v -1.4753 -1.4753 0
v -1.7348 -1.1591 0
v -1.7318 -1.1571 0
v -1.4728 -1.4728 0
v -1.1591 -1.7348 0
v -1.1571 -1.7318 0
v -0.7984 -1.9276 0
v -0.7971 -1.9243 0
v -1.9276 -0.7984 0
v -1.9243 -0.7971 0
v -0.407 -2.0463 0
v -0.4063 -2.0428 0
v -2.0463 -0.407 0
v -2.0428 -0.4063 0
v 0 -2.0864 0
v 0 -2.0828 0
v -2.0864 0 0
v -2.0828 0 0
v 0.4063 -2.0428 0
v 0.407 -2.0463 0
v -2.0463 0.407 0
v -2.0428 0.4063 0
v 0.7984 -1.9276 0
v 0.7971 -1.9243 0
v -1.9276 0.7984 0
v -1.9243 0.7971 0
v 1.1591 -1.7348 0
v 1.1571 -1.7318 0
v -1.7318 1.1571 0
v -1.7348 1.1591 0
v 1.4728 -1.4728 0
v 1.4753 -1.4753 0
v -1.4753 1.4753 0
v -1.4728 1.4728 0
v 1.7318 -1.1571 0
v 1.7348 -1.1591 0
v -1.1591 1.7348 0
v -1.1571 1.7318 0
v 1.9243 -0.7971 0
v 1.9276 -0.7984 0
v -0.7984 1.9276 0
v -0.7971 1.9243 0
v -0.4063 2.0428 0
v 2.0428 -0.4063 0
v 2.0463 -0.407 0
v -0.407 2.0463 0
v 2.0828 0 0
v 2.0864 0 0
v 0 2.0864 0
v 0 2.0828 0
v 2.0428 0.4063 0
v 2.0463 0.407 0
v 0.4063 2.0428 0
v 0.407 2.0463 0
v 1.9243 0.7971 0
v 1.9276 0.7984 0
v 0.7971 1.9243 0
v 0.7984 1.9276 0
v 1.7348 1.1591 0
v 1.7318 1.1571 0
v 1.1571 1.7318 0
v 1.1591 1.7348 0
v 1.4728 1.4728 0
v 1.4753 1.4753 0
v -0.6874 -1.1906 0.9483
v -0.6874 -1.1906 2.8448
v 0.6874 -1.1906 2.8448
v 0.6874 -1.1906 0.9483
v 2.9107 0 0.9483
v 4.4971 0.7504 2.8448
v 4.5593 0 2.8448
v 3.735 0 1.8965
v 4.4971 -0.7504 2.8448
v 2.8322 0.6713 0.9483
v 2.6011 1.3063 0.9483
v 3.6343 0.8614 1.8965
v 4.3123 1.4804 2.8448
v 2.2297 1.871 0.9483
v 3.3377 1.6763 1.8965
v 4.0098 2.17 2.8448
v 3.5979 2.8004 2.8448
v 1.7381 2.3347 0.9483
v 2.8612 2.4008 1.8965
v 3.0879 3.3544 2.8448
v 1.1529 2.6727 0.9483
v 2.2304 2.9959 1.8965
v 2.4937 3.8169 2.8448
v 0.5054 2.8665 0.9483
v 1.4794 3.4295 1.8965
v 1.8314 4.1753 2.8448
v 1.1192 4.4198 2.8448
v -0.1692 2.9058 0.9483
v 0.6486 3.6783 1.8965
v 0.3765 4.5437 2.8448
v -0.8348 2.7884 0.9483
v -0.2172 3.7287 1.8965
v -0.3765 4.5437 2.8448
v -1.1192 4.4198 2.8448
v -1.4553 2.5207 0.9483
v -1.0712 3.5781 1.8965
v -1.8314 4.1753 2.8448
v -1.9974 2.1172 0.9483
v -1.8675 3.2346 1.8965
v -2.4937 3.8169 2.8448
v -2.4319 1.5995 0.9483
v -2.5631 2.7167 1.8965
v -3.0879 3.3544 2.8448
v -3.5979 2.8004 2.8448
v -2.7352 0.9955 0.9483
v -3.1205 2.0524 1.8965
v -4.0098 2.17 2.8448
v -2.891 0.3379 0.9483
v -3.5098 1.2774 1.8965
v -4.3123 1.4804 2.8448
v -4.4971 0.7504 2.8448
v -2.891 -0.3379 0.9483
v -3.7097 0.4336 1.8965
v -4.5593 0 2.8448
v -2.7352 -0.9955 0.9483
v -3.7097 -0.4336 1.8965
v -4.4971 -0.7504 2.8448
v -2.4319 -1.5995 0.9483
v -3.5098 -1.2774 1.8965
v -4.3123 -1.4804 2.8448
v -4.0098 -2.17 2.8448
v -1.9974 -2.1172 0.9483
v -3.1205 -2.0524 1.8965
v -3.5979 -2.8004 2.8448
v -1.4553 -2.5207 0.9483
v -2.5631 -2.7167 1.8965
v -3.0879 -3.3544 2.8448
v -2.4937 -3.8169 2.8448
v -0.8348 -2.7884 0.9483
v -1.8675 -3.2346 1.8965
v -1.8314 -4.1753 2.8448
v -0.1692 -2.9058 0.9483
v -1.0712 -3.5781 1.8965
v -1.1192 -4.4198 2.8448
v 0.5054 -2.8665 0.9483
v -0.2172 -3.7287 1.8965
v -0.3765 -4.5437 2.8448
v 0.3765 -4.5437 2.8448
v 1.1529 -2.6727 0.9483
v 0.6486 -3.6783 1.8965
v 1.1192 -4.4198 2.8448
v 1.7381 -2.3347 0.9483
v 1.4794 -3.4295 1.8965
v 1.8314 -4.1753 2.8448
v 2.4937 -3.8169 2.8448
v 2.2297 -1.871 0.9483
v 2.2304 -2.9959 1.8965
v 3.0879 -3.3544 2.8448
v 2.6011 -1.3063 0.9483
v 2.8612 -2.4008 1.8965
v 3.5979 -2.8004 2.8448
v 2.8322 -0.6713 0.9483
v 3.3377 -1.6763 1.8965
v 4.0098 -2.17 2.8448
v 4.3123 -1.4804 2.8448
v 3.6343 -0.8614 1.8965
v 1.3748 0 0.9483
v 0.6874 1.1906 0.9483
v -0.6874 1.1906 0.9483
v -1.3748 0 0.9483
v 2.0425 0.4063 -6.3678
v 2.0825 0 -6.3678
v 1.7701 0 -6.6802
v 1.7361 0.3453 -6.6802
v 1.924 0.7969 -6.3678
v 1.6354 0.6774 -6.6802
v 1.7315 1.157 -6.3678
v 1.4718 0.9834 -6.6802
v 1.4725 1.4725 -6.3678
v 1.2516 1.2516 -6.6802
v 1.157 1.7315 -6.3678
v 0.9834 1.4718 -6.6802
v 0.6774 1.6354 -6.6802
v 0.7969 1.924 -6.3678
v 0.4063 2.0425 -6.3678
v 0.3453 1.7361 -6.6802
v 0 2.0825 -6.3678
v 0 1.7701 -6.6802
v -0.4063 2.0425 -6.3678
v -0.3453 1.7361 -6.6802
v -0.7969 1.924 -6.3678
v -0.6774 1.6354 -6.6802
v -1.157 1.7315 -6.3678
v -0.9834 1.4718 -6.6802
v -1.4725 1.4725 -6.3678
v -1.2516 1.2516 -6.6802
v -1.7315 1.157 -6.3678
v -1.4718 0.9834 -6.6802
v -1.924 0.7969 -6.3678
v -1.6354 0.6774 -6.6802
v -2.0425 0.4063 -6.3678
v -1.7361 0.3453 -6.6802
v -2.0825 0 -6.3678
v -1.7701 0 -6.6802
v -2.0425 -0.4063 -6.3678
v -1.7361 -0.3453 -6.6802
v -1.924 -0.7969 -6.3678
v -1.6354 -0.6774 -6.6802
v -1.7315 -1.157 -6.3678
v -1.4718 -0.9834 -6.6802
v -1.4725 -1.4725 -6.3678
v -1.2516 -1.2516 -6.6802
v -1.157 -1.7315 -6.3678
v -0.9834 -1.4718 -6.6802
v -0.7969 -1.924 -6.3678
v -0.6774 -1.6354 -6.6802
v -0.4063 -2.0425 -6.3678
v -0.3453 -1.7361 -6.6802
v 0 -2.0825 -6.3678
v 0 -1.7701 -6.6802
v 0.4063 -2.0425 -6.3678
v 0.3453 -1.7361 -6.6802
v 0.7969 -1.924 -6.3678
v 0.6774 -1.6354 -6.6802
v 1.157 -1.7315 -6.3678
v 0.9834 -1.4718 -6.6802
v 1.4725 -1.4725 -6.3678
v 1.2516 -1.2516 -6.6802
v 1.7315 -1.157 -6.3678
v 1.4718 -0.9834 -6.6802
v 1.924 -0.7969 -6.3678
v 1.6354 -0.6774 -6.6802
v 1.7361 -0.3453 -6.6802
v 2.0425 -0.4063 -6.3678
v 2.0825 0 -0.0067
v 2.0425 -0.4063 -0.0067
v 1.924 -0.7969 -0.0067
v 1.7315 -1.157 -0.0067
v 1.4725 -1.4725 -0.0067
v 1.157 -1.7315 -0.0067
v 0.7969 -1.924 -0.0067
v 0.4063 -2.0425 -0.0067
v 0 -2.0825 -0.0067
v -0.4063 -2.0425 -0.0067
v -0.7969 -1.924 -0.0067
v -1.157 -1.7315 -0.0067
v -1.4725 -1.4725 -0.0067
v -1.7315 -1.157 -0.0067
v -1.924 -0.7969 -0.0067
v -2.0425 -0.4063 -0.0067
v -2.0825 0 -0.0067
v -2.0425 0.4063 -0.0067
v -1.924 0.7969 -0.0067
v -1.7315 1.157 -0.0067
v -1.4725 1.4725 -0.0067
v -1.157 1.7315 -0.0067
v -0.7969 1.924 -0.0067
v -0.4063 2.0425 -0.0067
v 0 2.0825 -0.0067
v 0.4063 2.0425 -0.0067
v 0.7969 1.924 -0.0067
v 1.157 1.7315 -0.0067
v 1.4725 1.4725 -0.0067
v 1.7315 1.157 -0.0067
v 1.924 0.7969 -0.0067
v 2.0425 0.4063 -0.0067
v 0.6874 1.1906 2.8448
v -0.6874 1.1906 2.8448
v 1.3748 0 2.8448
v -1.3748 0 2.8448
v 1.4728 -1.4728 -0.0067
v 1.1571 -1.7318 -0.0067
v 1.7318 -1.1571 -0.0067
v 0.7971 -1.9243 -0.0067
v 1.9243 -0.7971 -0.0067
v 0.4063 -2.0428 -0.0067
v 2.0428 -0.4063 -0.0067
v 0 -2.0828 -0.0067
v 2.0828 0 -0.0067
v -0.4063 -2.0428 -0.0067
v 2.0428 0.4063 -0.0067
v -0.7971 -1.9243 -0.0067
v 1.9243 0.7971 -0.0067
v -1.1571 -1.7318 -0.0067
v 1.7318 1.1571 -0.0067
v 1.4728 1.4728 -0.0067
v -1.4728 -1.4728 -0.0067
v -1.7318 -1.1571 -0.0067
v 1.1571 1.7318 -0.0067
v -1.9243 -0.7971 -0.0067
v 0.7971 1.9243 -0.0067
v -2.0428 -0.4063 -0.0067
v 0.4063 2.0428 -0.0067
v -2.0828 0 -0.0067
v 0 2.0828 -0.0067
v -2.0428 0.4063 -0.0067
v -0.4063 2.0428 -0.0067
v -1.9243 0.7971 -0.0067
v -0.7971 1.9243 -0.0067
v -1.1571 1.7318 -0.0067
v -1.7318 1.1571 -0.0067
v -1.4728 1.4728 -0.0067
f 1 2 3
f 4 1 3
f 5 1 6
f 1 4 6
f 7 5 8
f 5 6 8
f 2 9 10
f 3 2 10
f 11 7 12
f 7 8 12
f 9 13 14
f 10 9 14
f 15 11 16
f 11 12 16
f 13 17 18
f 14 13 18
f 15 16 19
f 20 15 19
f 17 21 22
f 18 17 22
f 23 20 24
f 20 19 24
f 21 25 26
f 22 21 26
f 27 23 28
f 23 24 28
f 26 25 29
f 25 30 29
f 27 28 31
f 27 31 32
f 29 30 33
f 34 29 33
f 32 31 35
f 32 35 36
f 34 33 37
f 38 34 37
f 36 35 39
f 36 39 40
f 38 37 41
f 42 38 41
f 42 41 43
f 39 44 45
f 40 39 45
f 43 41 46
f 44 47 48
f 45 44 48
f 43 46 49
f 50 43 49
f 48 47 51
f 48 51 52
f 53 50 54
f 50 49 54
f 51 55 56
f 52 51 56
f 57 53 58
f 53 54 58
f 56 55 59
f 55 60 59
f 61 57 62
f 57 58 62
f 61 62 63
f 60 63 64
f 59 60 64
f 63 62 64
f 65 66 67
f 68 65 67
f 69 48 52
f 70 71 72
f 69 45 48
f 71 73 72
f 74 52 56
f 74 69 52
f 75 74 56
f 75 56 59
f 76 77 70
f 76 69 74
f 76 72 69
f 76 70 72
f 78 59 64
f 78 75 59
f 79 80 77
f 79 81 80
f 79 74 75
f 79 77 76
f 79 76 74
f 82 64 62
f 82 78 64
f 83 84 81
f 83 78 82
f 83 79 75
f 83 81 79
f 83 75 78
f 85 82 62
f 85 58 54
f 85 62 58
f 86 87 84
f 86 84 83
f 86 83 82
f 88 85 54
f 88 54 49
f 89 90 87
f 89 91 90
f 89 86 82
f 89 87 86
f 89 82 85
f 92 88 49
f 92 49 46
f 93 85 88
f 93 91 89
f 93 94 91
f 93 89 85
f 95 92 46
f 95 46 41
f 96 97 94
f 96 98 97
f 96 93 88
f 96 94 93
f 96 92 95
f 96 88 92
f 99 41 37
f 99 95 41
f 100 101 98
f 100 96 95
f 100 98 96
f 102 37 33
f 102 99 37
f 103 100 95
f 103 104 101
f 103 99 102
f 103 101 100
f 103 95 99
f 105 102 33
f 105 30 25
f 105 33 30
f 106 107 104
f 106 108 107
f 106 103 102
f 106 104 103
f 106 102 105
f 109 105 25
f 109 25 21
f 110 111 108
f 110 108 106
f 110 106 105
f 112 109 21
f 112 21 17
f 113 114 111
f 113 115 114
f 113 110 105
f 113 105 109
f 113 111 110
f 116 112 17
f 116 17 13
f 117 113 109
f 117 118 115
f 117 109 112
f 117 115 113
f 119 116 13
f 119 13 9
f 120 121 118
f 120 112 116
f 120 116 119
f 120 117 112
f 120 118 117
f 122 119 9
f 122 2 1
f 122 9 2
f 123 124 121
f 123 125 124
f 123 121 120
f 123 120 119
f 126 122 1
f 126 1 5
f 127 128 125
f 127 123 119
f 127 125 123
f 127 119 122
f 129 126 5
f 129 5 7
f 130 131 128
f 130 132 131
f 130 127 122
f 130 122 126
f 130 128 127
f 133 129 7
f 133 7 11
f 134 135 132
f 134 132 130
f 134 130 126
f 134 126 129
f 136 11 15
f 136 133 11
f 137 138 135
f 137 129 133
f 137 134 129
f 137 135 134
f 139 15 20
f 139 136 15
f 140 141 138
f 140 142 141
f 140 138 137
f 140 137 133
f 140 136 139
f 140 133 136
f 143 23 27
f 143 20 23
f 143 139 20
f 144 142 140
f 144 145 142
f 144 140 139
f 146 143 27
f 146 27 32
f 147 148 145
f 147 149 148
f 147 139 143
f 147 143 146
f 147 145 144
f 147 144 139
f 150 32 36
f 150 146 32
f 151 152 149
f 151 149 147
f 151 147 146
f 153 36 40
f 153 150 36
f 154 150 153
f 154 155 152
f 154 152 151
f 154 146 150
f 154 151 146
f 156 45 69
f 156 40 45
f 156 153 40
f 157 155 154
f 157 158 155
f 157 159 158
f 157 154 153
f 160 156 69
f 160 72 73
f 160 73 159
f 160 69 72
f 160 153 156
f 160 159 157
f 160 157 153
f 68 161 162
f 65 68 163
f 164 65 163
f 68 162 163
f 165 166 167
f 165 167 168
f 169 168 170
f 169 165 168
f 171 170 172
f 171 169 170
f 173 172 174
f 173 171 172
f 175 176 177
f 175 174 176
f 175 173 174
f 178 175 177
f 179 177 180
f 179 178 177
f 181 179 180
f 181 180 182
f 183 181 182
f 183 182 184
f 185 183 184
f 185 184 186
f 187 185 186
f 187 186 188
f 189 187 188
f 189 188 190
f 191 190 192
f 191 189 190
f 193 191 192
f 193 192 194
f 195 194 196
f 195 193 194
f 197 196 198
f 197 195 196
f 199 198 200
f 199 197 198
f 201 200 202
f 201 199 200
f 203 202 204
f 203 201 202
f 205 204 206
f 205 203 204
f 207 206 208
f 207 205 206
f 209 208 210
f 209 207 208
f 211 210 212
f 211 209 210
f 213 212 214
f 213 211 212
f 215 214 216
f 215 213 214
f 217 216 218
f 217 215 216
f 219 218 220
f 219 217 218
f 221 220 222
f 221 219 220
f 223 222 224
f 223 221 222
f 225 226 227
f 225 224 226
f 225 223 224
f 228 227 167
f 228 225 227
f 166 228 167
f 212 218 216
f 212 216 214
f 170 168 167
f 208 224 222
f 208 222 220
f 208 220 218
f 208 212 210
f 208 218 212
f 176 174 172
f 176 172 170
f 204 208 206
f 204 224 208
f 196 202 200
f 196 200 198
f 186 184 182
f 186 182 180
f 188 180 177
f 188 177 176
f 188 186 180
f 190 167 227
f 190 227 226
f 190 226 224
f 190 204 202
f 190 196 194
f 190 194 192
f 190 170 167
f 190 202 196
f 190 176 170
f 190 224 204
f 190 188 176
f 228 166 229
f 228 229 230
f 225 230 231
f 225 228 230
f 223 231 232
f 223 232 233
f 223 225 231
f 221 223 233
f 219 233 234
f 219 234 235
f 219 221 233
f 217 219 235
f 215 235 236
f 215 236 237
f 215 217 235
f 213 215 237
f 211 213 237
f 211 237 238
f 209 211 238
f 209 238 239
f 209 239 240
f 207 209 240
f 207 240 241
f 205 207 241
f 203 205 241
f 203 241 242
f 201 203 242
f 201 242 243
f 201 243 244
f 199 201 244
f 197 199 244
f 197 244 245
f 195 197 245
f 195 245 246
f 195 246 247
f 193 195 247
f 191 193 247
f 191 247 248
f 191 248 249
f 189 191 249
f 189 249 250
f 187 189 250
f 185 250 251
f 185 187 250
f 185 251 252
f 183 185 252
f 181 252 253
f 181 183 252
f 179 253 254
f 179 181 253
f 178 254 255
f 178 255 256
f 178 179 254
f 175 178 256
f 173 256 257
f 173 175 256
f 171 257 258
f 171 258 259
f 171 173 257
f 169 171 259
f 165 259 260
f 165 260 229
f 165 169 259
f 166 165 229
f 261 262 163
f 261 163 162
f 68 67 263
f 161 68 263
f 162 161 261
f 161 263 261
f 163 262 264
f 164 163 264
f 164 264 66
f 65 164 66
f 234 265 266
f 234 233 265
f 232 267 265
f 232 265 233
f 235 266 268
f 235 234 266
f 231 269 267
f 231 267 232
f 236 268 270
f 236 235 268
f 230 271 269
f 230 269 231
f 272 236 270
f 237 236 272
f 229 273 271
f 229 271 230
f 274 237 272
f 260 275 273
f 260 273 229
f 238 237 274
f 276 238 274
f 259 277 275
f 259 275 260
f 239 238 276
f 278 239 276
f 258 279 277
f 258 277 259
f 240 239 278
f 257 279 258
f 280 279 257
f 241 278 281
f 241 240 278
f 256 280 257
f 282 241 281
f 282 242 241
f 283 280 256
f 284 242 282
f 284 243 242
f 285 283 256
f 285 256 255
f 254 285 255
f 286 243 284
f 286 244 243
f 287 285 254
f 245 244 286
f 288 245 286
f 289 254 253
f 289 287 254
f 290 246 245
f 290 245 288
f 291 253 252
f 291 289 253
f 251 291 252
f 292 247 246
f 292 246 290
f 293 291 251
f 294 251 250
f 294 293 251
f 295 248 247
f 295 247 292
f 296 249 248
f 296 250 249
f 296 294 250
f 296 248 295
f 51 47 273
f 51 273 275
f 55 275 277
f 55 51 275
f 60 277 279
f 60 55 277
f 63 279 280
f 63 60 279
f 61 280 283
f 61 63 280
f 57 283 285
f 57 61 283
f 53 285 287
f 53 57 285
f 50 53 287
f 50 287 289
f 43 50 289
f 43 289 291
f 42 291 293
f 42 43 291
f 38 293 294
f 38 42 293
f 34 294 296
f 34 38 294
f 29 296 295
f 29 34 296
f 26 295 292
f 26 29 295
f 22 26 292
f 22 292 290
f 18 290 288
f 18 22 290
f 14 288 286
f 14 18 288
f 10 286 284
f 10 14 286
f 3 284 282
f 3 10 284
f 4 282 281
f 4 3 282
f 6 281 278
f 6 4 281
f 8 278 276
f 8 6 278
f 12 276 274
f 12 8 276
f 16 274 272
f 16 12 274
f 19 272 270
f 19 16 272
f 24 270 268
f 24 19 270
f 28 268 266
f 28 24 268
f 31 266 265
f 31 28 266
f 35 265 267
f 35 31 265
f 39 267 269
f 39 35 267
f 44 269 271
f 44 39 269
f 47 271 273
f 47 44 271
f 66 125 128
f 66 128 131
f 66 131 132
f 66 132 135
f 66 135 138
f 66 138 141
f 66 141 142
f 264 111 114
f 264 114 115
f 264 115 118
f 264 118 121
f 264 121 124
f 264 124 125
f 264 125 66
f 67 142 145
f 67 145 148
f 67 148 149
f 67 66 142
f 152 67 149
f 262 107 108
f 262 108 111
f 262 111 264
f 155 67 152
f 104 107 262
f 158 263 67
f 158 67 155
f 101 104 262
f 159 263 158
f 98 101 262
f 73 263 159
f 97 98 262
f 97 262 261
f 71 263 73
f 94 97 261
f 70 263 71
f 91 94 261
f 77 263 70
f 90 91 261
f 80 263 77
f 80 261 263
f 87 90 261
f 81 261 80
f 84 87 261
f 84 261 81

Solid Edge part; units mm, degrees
sketch "Sketch1" plane through (0, 0, 0) normal (0, 0, 1) x (1, 0, 0)
  circle A0 centre (0, 0) radius 4.5593
  dimension "D1" = 9.1186
extrude "Protrusion1" add sketch "Sketch1" along normal blind 2.8448
sketch "Sketch2" plane through (0, 0, 0) normal (0, 0, -1) x (1, 0, 0)
  circle A0 centre (0, 0) radius 2.0828
extrude "Protrusion2" add sketch "Sketch2" along normal blind 6.6802
sketch "Sketch3" plane through (0, 0, -6.6802) normal (0, 0, -1) x (1, 0, 0)
  circle A0 centre (0, 0) radius 2.0825
extrude "Cutout1" cut sketch "Sketch3" against normal blind 6.6735 flip side to cut
chamfer "Chamfer_1" distance 0.3124 angle 45 1 edges at (-2.0825, 0, -6.6802)
sketch "Sketch4" plane through (0, 0, 2.8448) normal (0, 0, 1) x (1, 0, 0)
  line L0 (-0.6874, 1.1906) -> (0.6874, 1.1906)
  line L1 (1.3748, 0) -> (0.6874, 1.1906)
  line L2 (0.6874, -1.1906) -> (1.3748, 0)
  line L3 (-0.6874, -1.1906) -> (0.6874, -1.1906)
  line L4 (-1.3748, 0) -> (-0.6874, -1.1906)
  line L5 (-0.6874, 1.1906) -> (-1.3748, 0)
  dimension "D1" = 2.3812
extrude "Cutout2" cut sketch "Sketch4" against normal blind 1.8965
sketch "Sketch5" plane through (0, 0, 0) normal (0, -1, 0) x (1, 0, 0)
  line L0 (4.5593, 2.8448) -> (2.0864, 0)
  line L1 (2.0864, 0) -> (4.5593, 0)
  line L2 (4.5593, 0) -> (4.5593, 2.8448)
revolve "RevolvedCutout1" cut sketch "Sketch5" angle 360 about axis through (0, 0, 14.0017) along (0, 0, -1)
properties part number "166340"
